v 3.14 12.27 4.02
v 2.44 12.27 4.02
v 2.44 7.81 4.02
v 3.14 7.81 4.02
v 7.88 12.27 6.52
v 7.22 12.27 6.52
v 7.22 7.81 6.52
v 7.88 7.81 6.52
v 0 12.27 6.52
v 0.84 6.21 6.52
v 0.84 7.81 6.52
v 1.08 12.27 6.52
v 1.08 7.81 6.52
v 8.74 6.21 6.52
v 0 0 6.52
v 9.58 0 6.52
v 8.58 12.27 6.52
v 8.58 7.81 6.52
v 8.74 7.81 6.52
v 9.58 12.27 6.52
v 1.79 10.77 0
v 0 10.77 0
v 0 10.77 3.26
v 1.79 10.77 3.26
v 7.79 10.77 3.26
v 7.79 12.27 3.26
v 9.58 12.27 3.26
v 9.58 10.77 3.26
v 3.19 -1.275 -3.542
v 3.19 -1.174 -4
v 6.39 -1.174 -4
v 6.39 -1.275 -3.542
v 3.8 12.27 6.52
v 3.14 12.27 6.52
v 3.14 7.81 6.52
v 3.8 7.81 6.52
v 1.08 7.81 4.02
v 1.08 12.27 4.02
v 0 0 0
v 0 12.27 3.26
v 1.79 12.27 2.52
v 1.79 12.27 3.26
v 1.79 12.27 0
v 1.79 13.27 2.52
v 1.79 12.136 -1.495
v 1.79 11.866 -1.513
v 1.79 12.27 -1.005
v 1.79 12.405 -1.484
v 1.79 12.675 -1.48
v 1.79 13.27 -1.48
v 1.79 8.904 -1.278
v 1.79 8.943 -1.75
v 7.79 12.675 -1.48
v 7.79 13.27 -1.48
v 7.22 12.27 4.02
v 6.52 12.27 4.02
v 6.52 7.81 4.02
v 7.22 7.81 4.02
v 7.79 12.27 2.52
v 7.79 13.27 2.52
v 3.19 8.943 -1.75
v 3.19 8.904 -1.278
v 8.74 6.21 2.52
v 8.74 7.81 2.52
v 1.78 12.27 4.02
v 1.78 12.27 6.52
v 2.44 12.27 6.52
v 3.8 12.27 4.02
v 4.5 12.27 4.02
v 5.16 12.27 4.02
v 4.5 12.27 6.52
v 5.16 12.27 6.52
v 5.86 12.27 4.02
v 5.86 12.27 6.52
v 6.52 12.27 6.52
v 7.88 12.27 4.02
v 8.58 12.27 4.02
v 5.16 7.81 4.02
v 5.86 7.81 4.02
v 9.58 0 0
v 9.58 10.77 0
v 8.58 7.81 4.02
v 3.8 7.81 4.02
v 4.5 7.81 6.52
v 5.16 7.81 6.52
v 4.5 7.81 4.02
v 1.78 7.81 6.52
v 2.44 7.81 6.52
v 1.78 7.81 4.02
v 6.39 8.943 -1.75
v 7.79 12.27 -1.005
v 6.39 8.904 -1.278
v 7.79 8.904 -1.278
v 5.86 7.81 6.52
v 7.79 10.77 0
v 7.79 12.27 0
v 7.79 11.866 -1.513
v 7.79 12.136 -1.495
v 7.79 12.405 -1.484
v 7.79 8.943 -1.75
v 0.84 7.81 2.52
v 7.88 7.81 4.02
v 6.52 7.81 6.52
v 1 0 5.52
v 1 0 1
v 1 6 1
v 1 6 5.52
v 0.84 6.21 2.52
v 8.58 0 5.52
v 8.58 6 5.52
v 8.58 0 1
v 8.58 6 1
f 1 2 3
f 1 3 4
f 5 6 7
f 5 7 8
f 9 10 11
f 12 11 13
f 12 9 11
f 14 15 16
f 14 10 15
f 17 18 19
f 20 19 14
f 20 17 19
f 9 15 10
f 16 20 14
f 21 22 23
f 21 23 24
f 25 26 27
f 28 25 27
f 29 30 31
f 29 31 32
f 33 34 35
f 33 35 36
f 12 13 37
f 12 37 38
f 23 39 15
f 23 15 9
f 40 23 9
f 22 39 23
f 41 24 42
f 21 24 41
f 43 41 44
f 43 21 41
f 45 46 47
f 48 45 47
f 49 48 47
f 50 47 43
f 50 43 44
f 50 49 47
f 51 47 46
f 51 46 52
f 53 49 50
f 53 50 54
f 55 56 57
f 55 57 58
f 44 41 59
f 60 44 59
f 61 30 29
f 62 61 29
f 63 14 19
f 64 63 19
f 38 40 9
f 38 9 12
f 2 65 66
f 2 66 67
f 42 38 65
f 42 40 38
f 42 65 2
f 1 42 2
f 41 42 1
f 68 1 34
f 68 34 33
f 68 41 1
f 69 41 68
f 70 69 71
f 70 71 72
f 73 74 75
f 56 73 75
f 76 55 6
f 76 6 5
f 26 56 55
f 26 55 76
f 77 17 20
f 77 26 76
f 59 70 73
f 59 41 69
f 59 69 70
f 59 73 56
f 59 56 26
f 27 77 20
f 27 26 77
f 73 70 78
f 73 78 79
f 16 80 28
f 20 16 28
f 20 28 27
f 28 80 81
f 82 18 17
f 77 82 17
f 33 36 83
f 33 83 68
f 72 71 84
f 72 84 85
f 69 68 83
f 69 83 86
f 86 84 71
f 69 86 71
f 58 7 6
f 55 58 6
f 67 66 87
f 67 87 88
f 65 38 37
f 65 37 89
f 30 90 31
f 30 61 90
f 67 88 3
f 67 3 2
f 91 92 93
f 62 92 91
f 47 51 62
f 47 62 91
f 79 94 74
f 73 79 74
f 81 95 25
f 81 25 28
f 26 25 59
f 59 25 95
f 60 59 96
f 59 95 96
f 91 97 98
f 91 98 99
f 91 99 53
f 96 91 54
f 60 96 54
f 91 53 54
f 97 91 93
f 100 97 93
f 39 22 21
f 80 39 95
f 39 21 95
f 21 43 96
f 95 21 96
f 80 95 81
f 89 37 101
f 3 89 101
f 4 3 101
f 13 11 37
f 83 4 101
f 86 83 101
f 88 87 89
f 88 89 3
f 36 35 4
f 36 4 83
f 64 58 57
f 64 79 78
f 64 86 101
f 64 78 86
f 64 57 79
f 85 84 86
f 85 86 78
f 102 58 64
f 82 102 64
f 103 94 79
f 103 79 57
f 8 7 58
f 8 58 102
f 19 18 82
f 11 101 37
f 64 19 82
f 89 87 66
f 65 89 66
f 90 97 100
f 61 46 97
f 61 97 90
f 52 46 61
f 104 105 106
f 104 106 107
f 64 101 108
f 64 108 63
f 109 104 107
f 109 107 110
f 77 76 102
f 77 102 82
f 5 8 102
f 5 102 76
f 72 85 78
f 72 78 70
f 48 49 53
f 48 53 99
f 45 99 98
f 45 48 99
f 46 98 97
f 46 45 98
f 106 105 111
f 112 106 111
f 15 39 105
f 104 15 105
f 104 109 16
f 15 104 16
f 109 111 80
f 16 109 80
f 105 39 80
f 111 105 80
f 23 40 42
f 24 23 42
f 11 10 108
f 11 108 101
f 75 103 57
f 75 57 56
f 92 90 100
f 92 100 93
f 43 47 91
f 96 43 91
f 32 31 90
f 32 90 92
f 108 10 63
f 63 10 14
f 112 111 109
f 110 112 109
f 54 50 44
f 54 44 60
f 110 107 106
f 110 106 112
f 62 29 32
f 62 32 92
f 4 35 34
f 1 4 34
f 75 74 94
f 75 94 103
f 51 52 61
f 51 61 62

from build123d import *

# Parameters (mm, degrees)
SKETCH_1_W          = 9.58
SKETCH_1_H          = 12.27
EXTRUDE_1_DEPTH     = 6.52
SKETCH_2_W          = 7.9
SKETCH_2_H          = 1.6
CUT_EXTRUDE_1_DEPTH = 4
SKETCH_3_W          = 0.7
SKETCH_3_H          = 5.068026785
CUT_EXTRUDE_2_DEPTH = 2.5
SKETCH_4_W          = 6
SKETCH_4_H          = 4
EXTRUDE_2_DEPTH     = 1
SKETCH_5_W          = 1.79
SKETCH_5_H          = 3.771756959
CUT_EXTRUDE_3_DEPTH = 1.5
EXTRUDE_3_DEPTH     = 3
EXTRUDE_4_DEPTH     = 1.6
FILLET_1_R          = 10
SKETCH_8_W          = 7.58
SKETCH_8_H          = 4.52
CUT_EXTRUDE_4_DEPTH = 6


with BuildPart() as part:
    # 草图1 → 凸台-拉伸1 (new body)
    with BuildSketch(Plane.XY):
        with Locations((4.79, 6.135)):
            Rectangle(SKETCH_1_W, SKETCH_1_H)
    extrude(amount=EXTRUDE_1_DEPTH)

    # 草图2 → 切除-拉伸1 (cut)
    with BuildSketch(Plane.XY.offset(6.52)):
        with Locations((4.79, 7.01)):
            Rectangle(SKETCH_2_W, SKETCH_2_H)
    extrude(amount=-CUT_EXTRUDE_1_DEPTH, mode=Mode.SUBTRACT)

    # 草图3 → 切除-拉伸2 (cut)
    with BuildSketch(Plane.XY.offset(6.52)):
        with Locations((8.23, 10.008542357)):
            Rectangle(SKETCH_3_W, SKETCH_3_H)
        with Locations((6.87, 10.008542357)):
            Rectangle(SKETCH_3_W, SKETCH_3_H)
        with Locations((5.51, 10.008542357)):
            Rectangle(SKETCH_3_W, SKETCH_3_H)
        with Locations((4.15, 10.008542357)):
            Rectangle(SKETCH_3_W, SKETCH_3_H)
        with Locations((2.79, 10.008542357)):
            Rectangle(SKETCH_3_W, SKETCH_3_H)
        with Locations((1.43, 10.008542357)):
            Rectangle(SKETCH_3_W, SKETCH_3_H)
    extrude(amount=-CUT_EXTRUDE_2_DEPTH, mode=Mode.SUBTRACT)

    # 草图4 → 凸台-拉伸2 (add)
    with BuildSketch(Plane(origin=(0, 12.27, 0), x_dir=(1, 0, 0), z_dir=(0, 1, 0))):
        with Locations((4.79, -0.52)):
            Rectangle(SKETCH_4_W, SKETCH_4_H)
    extrude(amount=EXTRUDE_2_DEPTH)

    # 草图5 → 切除-拉伸3 (cut)
    with BuildSketch(Plane(origin=(0, 12.27, 0), x_dir=(1, 0, 0), z_dir=(0, 1, 0))):
        with Locations((8.685, -1.374121521)):
            Rectangle(SKETCH_5_W, SKETCH_5_H)
        with Locations((0.895, -1.374121521)):
            Rectangle(SKETCH_5_W, SKETCH_5_H)
    extrude(amount=-CUT_EXTRUDE_3_DEPTH, mode=Mode.SUBTRACT)

    # 草图6 → 凸台-拉伸3 (add, symmetric)
    with BuildSketch(Plane.ZY.offset(-4.79)):
        Polygon((-1.48, 12.27), (-1.75, 8.942581669), (-1.278125841, 8.904291917), (-1.005018858, 12.27), align=None)
    extrude(amount=EXTRUDE_3_DEPTH, both=True)

    # 草图7 → 凸台-拉伸4 (add, symmetric)
    with BuildSketch(Plane.ZY.offset(-4.79)):
        Polygon((-1.75, 8.942581669), (-4, -1.173649155), (-3.542253598, -1.275458754), (-1.278125841, 8.904291917), align=None)
    extrude(amount=EXTRUDE_4_DEPTH, both=True)

    # 圆角1
    # the kernel refuses this fillet: 10 mm, written as the material it adds along each edge
    with BuildSketch(Plane(origin=(1.79, 12.27, -1.48), x_dir=(0, -0.9967239953538545, -0.08087816198362402), z_dir=(1, 0, 0))) as fillet_1_piece_1:
        with BuildLine():
            CenterArc((FILLET_1_R * 0.0405054289786, FILLET_1_R), FILLET_1_R, 265.360955713, 4.639044287)
            Line((-FILLET_1_R * 0.040372733005, FILLET_1_R * 0.00327600464615), (0, 0))
            Line((0, 0), (FILLET_1_R * 0.0405054289786, 0))
        make_face()
    extrude(amount=6)

    # 草图8 → 切除-拉伸4 (cut)
    with BuildSketch(Plane.XZ):
        with Locations((4.79, 3.26)):
            Rectangle(SKETCH_8_W, SKETCH_8_H)
    extrude(amount=-CUT_EXTRUDE_4_DEPTH, mode=Mode.SUBTRACT)


solid = part.part
